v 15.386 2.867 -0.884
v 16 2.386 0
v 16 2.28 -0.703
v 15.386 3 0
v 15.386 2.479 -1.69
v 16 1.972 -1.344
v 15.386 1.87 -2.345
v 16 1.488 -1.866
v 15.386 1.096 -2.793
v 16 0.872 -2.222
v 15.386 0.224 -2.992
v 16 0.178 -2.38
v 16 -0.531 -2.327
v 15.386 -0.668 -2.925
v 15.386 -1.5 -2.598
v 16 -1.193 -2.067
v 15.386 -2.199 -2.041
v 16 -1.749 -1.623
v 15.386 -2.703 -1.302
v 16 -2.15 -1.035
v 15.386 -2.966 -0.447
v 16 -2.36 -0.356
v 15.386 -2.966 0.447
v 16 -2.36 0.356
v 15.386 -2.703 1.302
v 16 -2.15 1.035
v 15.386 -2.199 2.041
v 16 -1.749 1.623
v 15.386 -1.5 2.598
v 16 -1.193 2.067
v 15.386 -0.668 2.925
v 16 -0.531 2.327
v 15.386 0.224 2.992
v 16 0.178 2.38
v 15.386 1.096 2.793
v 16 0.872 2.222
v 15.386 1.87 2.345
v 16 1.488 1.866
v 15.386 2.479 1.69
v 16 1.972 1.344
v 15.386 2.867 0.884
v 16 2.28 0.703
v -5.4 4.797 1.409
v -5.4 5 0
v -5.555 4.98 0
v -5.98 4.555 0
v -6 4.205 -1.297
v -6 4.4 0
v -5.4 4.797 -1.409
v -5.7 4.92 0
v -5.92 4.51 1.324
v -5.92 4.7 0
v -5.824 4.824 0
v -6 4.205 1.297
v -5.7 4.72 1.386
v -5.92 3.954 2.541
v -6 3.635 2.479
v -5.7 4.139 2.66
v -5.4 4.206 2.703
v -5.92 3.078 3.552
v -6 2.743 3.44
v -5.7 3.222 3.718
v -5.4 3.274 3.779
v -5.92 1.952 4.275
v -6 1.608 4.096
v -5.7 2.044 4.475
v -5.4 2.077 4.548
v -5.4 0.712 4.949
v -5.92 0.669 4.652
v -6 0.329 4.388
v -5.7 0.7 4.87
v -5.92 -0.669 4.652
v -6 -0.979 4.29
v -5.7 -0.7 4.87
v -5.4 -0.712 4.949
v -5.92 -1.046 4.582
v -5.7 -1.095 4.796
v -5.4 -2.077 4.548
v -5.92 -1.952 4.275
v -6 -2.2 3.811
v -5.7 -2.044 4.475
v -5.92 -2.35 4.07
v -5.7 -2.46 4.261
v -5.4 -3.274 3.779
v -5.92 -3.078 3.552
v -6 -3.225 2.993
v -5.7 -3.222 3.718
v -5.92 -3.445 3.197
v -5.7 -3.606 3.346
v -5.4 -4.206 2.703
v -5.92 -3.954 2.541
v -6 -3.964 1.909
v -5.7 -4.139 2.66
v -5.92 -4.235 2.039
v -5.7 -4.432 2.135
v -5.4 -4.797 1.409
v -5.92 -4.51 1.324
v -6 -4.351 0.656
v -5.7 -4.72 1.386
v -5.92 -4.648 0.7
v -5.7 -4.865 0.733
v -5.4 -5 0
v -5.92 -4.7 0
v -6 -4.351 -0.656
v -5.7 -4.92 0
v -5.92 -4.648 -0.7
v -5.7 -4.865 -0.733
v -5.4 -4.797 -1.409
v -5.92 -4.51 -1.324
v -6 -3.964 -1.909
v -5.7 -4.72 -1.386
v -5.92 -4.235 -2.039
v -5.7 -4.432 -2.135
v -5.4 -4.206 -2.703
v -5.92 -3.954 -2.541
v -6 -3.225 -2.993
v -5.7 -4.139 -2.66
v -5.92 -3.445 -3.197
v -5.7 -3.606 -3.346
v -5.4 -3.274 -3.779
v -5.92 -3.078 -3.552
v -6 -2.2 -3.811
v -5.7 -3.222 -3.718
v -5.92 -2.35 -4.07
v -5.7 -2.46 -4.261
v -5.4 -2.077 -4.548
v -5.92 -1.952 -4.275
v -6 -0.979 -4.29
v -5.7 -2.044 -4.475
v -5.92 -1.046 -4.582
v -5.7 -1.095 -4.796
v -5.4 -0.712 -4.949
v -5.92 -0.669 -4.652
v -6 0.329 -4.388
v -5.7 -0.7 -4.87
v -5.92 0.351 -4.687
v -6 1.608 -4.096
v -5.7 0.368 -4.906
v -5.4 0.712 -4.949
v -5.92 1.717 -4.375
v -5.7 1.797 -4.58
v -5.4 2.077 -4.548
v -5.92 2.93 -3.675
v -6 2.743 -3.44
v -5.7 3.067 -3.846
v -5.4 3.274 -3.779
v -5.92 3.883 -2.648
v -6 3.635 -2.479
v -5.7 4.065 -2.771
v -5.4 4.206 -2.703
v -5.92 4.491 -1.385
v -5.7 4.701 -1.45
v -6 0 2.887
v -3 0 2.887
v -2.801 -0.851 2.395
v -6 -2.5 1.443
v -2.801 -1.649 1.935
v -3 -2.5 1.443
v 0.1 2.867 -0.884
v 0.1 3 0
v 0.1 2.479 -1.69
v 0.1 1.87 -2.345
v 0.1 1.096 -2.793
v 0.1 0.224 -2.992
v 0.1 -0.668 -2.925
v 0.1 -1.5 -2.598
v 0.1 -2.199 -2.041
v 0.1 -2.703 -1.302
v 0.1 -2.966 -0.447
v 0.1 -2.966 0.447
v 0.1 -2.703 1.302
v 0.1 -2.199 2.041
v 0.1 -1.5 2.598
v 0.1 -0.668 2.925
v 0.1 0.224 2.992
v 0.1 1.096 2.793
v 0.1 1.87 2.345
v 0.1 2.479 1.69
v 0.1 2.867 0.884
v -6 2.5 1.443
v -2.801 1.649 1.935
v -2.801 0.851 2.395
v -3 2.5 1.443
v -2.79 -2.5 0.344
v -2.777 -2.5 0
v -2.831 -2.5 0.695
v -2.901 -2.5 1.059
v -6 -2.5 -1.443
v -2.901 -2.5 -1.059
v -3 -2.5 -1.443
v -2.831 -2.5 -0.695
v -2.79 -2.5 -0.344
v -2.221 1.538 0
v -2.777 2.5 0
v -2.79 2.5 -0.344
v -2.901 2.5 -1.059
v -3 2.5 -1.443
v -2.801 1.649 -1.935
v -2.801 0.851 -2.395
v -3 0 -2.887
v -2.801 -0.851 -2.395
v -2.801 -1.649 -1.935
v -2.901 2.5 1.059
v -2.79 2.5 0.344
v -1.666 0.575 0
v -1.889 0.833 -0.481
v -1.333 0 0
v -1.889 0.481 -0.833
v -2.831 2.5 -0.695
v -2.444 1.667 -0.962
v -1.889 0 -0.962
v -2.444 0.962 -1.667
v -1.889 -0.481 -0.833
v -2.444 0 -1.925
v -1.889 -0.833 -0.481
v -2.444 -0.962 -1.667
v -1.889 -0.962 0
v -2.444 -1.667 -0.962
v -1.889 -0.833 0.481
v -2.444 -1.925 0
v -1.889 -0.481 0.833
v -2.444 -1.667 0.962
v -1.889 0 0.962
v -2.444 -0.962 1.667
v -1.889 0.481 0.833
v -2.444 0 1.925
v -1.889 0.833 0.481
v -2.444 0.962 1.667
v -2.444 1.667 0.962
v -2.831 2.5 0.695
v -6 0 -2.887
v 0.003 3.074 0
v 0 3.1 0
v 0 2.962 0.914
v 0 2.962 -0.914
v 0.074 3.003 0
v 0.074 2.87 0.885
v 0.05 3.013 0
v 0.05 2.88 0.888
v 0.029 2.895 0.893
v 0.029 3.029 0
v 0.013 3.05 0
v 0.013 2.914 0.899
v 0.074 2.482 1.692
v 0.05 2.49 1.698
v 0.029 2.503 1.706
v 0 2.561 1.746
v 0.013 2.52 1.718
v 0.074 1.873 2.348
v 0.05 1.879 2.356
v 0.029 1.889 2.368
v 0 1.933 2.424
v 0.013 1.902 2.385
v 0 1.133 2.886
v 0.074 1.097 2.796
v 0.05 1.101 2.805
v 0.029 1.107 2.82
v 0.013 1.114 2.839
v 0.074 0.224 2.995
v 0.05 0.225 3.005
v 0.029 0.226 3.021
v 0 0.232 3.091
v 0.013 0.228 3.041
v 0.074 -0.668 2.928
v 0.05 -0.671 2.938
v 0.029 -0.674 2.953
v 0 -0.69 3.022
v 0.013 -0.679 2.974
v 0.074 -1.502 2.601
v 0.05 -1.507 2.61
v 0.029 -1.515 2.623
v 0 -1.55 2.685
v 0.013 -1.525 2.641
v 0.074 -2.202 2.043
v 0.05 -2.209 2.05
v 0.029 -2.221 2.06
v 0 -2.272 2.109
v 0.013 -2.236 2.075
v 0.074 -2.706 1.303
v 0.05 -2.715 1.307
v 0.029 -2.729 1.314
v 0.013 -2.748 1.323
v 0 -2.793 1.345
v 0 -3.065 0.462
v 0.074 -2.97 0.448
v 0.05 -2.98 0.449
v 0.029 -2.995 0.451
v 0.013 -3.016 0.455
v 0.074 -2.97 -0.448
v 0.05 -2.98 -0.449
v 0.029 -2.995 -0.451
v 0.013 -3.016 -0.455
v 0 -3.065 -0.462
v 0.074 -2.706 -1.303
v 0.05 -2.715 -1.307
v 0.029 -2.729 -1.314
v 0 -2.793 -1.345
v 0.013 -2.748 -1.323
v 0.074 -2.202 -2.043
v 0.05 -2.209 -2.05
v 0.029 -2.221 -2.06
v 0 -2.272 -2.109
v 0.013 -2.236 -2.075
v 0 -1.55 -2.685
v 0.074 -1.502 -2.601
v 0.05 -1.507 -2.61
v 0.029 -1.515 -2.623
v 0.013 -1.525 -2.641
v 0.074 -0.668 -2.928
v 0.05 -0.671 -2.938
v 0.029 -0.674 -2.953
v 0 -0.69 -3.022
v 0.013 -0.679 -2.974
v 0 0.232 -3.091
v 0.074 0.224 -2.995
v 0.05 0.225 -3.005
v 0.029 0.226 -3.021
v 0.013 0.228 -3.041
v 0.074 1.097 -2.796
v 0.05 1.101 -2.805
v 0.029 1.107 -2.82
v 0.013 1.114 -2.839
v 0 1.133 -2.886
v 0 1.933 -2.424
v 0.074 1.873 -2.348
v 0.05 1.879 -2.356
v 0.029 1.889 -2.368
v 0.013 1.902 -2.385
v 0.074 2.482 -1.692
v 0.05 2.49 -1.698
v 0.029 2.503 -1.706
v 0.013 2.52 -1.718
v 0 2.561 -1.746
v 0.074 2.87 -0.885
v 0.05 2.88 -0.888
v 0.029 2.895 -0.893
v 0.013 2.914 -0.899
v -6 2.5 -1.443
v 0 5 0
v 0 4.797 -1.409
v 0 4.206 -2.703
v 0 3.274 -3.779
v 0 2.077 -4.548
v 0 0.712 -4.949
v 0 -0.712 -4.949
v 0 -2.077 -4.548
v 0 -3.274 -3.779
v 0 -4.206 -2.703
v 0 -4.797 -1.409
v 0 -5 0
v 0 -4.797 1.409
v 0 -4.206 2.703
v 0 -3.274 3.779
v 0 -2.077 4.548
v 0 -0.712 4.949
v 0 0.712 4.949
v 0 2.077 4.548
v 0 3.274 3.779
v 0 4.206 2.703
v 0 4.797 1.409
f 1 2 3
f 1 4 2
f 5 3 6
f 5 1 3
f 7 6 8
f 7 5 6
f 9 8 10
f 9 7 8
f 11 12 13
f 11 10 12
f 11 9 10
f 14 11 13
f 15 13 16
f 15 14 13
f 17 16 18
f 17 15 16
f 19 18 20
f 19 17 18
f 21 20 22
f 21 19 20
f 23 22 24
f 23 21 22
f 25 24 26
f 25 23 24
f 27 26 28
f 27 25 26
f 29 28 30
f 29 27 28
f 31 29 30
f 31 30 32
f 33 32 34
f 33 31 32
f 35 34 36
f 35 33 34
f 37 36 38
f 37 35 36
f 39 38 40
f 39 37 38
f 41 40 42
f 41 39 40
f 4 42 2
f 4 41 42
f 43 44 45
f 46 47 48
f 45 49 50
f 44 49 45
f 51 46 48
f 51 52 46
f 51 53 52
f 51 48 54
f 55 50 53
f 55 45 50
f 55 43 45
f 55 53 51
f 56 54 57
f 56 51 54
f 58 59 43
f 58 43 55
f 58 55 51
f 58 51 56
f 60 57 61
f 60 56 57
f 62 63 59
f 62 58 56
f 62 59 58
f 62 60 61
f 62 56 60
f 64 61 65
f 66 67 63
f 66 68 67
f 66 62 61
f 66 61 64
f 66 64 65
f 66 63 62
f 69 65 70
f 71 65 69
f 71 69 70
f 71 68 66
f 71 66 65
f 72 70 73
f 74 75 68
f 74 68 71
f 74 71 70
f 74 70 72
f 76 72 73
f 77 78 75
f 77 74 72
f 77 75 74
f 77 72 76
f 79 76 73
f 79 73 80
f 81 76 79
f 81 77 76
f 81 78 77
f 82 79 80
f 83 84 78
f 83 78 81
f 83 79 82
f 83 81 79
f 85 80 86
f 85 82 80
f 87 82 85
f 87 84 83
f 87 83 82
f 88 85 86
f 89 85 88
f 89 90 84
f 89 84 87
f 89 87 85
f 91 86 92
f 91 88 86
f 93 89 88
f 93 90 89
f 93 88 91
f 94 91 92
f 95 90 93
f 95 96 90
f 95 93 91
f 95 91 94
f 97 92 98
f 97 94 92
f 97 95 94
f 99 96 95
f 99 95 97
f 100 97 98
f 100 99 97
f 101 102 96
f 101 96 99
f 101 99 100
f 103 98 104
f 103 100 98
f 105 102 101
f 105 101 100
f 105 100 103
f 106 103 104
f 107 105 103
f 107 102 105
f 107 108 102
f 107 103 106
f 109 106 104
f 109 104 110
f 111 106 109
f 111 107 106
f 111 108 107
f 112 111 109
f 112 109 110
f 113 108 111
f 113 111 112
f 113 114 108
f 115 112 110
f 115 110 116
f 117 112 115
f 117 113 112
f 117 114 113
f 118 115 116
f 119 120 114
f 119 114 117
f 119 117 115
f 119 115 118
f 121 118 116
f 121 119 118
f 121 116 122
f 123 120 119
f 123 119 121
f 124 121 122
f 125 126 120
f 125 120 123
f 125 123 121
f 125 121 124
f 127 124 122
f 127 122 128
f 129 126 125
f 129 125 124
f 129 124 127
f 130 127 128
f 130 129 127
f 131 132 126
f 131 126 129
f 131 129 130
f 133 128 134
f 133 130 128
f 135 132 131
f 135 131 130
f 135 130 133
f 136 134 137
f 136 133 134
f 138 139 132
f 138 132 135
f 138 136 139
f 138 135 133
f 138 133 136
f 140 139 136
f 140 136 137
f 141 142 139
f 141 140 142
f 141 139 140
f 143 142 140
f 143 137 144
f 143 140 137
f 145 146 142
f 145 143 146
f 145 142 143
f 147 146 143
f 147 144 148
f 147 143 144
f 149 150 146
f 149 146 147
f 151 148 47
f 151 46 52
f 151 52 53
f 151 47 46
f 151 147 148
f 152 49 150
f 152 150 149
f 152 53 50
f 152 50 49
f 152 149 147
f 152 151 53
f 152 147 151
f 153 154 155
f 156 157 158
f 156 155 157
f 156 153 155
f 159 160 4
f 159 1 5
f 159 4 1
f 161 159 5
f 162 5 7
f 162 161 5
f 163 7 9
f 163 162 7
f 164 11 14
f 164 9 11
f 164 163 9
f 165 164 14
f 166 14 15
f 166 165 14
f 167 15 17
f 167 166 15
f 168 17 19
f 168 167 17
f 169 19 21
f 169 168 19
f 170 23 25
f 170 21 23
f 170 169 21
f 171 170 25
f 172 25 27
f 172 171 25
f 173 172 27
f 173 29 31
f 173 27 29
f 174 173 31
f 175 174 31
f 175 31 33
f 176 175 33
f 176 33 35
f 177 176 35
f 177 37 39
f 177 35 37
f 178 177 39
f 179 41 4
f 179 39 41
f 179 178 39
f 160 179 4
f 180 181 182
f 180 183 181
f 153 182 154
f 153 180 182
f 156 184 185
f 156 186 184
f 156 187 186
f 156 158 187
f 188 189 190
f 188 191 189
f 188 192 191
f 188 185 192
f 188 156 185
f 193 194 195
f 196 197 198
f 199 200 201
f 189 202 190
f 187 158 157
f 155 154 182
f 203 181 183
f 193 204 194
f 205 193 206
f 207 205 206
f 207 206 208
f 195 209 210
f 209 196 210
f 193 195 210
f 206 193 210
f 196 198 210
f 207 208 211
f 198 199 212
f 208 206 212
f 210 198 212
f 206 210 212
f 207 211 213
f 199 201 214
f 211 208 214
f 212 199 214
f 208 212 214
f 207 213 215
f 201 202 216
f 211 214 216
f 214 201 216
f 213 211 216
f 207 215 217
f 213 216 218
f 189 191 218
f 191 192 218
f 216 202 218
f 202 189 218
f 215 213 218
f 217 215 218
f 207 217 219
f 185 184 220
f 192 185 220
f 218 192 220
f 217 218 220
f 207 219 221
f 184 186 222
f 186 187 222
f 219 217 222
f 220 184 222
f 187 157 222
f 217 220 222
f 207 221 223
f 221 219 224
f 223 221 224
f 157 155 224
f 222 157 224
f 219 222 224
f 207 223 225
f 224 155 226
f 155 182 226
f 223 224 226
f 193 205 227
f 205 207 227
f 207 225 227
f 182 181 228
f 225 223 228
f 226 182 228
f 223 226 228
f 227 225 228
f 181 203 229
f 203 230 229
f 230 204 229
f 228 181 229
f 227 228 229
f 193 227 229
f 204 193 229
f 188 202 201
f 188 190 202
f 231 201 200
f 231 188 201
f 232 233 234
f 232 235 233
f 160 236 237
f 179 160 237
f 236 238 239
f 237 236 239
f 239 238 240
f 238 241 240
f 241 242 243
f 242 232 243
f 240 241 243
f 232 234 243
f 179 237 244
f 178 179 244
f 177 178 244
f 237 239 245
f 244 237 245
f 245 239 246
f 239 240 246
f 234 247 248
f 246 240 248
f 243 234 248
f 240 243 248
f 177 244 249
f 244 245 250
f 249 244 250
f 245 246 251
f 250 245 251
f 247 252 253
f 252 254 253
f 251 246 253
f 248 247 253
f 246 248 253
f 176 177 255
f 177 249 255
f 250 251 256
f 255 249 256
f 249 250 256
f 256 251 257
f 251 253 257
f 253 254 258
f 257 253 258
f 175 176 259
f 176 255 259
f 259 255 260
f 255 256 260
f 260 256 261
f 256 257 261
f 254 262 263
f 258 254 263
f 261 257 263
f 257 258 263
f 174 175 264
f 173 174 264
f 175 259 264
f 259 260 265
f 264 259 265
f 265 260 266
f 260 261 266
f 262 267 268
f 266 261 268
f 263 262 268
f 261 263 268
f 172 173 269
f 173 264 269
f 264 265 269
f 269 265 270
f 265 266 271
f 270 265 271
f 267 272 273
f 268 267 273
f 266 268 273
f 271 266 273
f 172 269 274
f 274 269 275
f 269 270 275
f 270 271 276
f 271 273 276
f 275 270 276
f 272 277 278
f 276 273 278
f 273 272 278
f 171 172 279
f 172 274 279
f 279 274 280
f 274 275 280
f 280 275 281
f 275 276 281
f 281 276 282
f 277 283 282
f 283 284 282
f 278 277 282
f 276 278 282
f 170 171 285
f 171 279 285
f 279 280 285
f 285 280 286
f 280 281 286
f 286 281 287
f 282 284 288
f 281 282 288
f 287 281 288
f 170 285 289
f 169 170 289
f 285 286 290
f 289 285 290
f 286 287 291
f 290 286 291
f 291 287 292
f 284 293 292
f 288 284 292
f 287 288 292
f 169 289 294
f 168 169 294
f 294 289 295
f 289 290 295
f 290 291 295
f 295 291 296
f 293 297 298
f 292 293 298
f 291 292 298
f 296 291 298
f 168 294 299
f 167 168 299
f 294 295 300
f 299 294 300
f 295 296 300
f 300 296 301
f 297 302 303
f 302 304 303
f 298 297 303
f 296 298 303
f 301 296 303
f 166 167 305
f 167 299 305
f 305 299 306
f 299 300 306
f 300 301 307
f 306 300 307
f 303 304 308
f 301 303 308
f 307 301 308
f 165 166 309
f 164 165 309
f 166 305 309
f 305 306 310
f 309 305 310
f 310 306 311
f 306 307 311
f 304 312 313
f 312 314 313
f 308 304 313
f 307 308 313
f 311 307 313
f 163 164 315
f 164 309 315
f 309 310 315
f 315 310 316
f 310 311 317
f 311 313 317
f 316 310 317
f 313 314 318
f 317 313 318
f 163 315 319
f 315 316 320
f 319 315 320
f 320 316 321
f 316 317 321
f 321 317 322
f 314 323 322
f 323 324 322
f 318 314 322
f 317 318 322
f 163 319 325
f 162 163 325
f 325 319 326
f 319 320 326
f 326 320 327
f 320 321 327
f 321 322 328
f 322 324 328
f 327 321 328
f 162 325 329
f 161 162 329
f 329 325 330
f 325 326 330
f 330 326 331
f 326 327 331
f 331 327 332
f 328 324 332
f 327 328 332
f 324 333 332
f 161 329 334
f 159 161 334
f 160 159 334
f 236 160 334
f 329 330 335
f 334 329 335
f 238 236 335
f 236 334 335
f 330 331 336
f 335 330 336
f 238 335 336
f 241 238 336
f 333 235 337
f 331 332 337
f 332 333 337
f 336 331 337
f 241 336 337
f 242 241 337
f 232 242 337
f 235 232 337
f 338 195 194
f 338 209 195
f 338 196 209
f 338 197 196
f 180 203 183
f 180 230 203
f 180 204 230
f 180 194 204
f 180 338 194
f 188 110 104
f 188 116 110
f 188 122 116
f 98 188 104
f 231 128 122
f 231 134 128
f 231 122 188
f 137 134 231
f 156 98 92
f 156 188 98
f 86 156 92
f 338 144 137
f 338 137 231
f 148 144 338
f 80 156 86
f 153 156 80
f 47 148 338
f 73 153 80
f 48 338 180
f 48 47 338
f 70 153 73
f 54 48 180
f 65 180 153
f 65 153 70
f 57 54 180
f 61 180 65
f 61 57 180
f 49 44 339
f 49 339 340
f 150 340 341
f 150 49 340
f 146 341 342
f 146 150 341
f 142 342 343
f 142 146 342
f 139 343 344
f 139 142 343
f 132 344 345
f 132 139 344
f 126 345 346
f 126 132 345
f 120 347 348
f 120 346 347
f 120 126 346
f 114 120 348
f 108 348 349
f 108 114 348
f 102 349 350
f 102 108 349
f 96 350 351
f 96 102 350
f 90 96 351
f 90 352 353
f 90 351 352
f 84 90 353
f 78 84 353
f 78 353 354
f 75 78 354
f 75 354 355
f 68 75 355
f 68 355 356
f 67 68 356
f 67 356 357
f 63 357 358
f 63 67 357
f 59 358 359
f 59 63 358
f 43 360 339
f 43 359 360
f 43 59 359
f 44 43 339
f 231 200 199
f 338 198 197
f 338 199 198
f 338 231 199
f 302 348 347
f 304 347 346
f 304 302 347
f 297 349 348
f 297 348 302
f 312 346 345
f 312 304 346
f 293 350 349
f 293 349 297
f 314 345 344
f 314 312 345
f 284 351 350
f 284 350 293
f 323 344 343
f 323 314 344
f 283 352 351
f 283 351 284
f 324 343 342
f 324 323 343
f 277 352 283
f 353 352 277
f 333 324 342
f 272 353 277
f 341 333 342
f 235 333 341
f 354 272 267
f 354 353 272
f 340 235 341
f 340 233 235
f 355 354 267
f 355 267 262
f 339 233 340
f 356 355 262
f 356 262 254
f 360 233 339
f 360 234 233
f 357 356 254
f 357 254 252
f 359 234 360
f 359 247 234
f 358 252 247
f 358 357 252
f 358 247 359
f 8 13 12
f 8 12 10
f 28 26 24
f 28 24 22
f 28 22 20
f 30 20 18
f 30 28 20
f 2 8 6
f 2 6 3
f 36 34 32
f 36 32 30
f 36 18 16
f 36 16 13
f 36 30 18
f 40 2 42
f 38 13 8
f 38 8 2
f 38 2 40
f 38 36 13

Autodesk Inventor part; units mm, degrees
ref_plane "YZ Plane" through (0, 0, 0) normal (1, 0, 0) x (0, 1, 0)
ref_plane "XZ Plane" through (0, 0, 0) normal (0, 1, 0) x (-1, 0, 0)
sketch "Sketch1" plane through (0, 0, 0) normal (0, 0, 1) x (1, 0, 0)
  line L0 (-1.3333, 0) -> (16, 0)
  line L1 (16, 0) -> (16, 3)
  line L2 (16, 3) -> (3, 3)
  line L3 (3, 3) -> (2.3864, 3)
  line L4 (2.3864, 3) -> (0, 3)
  line L5 (0, 3) -> (0, 5)
  line L6 (0, 5) -> (-6, 5)
  line L7 (-6, 5) -> (-6, 2.8868)
  line L8 (-6, 2.8868) -> (-3, 2.8868)
  line L9 (-3, 2.8868) -> (-1.3333, 0)
  line L10 (-10.4, 0) -> (20.4, 0) projected
  line L11 (0, -1) -> (0, 6) projected
  line L12 (3, 3) -> (0, 3) construction
  dimension "d1" = 13
  dimension "d2" = 0.6136
  dimension "d3" = 6
  dimension "d4" = 3
  dimension "d5" = 60
  dimension "d6" = 6
  dimension "d7" = 6
  dimension "d8" = 5.7735
  dimension "d9" = 10
  dimension "d26" = 16
revolve "Body" add sketch "Sketch1" angle 360 about axis through (-1.3333, 0, 0) along (1, 0, 0)
sketch "Sketch2" plane through (-6, 0, 0) normal (-1, 0, 0) x (0, 0, 1)
  circle A0 centre (0, 0) radius 2.8868 projected
  line L0 (0, -7) -> (0, 7) projected
  line L1 (-7, 0) -> (7, 0) projected
  line L2 (2.8868, 0) -> (1.4434, -2.5)
  line L3 (1.4434, -2.5) -> (-1.4434, -2.5)
  line L4 (-1.4434, -2.5) -> (-2.8868, 0)
  line L5 (-2.8868, 0) -> (-1.4434, 2.5)
  line L6 (-1.4434, 2.5) -> (1.4434, 2.5)
  line L7 (1.4434, 2.5) -> (2.8868, 0)
extrude "Slot" add sketch "Sketch2" against normal up to next contours L7 A0 | A0 L2 | L6 L0 A0 | A0 L0 L3 | L0 L6 A0 | A0 L3 L0 | L4 A0 | A0 L5
fillet "Fillet1" radius 0.6 1 edges at (-6, -5, 0)
thread "Thread" size "M6x1" class "6g" standard "ISO Metric profile" length 13
chamfer "Chamfer1" distance 0.6135 distance2 0.6135 1 edges at (16, -3, 0) measured on face at (16, -1.1424, 0.935)
ref_plane "Work Plane1" through (29, 0, 0) normal (0, -1, 0) x (1, 0, 0)
fillet "Fillet2" radius 0.1 1 edges at (0, -3, 0)
equation "\"d30\" = R"
equation "\"d17\" = RR"
equation "\"d13\" = GEL"
equation "\"d15\" = -0.5 * SPD + 0.5 * GD"
equation "\"d16\" = GUL"
equation "\"d1\" = GEL"
equation "\"d3\" = KOH"
equation "\"d4\" = INTI"
equation "\"d6\" = GD"
equation "\"d7\" = BDM"
equation "\"d8\" = 1.1547 * SW"
equation "\"d9\" = KOD"
equation "\"d26\" = NLG"
equation "\"GD\" = NND"
equation "\"NLG\" = 16"
equation "\"GEL\" = 13"
equation "\"KOD\" = 10"
equation "\"KOH\" = 6"
equation "\"INTI\" = 3"
equation "\"GAL\" = 0.61345 * PTC"
equation "\"GUL\" = 0.61345 * PTC"
equation "\"BDM\" = NND"
equation "\"SW\" = 5"
equation "\"RR\" = 0.6"
equation "\"SPD\" = NND - 1.2269 * PTC"
equation "\"R\" = 0.1"
equation "\"PHH\" = 0.25"
equation "\"GD1\" = THREADDIA - 1.2269 * PTC"
equation "\"THREADDIA\" = 6"
equation "\"FAWI\" = 45deg"
equation "\"PTC\" = 1"
equation "\"NND\" = 6"
equation "\"TOA\" = 30deg"
equation "\"E0\" = 1.155 * SW"
properties part number "JIS B 1176 - M6 x 16" material "Steel, Mild"
